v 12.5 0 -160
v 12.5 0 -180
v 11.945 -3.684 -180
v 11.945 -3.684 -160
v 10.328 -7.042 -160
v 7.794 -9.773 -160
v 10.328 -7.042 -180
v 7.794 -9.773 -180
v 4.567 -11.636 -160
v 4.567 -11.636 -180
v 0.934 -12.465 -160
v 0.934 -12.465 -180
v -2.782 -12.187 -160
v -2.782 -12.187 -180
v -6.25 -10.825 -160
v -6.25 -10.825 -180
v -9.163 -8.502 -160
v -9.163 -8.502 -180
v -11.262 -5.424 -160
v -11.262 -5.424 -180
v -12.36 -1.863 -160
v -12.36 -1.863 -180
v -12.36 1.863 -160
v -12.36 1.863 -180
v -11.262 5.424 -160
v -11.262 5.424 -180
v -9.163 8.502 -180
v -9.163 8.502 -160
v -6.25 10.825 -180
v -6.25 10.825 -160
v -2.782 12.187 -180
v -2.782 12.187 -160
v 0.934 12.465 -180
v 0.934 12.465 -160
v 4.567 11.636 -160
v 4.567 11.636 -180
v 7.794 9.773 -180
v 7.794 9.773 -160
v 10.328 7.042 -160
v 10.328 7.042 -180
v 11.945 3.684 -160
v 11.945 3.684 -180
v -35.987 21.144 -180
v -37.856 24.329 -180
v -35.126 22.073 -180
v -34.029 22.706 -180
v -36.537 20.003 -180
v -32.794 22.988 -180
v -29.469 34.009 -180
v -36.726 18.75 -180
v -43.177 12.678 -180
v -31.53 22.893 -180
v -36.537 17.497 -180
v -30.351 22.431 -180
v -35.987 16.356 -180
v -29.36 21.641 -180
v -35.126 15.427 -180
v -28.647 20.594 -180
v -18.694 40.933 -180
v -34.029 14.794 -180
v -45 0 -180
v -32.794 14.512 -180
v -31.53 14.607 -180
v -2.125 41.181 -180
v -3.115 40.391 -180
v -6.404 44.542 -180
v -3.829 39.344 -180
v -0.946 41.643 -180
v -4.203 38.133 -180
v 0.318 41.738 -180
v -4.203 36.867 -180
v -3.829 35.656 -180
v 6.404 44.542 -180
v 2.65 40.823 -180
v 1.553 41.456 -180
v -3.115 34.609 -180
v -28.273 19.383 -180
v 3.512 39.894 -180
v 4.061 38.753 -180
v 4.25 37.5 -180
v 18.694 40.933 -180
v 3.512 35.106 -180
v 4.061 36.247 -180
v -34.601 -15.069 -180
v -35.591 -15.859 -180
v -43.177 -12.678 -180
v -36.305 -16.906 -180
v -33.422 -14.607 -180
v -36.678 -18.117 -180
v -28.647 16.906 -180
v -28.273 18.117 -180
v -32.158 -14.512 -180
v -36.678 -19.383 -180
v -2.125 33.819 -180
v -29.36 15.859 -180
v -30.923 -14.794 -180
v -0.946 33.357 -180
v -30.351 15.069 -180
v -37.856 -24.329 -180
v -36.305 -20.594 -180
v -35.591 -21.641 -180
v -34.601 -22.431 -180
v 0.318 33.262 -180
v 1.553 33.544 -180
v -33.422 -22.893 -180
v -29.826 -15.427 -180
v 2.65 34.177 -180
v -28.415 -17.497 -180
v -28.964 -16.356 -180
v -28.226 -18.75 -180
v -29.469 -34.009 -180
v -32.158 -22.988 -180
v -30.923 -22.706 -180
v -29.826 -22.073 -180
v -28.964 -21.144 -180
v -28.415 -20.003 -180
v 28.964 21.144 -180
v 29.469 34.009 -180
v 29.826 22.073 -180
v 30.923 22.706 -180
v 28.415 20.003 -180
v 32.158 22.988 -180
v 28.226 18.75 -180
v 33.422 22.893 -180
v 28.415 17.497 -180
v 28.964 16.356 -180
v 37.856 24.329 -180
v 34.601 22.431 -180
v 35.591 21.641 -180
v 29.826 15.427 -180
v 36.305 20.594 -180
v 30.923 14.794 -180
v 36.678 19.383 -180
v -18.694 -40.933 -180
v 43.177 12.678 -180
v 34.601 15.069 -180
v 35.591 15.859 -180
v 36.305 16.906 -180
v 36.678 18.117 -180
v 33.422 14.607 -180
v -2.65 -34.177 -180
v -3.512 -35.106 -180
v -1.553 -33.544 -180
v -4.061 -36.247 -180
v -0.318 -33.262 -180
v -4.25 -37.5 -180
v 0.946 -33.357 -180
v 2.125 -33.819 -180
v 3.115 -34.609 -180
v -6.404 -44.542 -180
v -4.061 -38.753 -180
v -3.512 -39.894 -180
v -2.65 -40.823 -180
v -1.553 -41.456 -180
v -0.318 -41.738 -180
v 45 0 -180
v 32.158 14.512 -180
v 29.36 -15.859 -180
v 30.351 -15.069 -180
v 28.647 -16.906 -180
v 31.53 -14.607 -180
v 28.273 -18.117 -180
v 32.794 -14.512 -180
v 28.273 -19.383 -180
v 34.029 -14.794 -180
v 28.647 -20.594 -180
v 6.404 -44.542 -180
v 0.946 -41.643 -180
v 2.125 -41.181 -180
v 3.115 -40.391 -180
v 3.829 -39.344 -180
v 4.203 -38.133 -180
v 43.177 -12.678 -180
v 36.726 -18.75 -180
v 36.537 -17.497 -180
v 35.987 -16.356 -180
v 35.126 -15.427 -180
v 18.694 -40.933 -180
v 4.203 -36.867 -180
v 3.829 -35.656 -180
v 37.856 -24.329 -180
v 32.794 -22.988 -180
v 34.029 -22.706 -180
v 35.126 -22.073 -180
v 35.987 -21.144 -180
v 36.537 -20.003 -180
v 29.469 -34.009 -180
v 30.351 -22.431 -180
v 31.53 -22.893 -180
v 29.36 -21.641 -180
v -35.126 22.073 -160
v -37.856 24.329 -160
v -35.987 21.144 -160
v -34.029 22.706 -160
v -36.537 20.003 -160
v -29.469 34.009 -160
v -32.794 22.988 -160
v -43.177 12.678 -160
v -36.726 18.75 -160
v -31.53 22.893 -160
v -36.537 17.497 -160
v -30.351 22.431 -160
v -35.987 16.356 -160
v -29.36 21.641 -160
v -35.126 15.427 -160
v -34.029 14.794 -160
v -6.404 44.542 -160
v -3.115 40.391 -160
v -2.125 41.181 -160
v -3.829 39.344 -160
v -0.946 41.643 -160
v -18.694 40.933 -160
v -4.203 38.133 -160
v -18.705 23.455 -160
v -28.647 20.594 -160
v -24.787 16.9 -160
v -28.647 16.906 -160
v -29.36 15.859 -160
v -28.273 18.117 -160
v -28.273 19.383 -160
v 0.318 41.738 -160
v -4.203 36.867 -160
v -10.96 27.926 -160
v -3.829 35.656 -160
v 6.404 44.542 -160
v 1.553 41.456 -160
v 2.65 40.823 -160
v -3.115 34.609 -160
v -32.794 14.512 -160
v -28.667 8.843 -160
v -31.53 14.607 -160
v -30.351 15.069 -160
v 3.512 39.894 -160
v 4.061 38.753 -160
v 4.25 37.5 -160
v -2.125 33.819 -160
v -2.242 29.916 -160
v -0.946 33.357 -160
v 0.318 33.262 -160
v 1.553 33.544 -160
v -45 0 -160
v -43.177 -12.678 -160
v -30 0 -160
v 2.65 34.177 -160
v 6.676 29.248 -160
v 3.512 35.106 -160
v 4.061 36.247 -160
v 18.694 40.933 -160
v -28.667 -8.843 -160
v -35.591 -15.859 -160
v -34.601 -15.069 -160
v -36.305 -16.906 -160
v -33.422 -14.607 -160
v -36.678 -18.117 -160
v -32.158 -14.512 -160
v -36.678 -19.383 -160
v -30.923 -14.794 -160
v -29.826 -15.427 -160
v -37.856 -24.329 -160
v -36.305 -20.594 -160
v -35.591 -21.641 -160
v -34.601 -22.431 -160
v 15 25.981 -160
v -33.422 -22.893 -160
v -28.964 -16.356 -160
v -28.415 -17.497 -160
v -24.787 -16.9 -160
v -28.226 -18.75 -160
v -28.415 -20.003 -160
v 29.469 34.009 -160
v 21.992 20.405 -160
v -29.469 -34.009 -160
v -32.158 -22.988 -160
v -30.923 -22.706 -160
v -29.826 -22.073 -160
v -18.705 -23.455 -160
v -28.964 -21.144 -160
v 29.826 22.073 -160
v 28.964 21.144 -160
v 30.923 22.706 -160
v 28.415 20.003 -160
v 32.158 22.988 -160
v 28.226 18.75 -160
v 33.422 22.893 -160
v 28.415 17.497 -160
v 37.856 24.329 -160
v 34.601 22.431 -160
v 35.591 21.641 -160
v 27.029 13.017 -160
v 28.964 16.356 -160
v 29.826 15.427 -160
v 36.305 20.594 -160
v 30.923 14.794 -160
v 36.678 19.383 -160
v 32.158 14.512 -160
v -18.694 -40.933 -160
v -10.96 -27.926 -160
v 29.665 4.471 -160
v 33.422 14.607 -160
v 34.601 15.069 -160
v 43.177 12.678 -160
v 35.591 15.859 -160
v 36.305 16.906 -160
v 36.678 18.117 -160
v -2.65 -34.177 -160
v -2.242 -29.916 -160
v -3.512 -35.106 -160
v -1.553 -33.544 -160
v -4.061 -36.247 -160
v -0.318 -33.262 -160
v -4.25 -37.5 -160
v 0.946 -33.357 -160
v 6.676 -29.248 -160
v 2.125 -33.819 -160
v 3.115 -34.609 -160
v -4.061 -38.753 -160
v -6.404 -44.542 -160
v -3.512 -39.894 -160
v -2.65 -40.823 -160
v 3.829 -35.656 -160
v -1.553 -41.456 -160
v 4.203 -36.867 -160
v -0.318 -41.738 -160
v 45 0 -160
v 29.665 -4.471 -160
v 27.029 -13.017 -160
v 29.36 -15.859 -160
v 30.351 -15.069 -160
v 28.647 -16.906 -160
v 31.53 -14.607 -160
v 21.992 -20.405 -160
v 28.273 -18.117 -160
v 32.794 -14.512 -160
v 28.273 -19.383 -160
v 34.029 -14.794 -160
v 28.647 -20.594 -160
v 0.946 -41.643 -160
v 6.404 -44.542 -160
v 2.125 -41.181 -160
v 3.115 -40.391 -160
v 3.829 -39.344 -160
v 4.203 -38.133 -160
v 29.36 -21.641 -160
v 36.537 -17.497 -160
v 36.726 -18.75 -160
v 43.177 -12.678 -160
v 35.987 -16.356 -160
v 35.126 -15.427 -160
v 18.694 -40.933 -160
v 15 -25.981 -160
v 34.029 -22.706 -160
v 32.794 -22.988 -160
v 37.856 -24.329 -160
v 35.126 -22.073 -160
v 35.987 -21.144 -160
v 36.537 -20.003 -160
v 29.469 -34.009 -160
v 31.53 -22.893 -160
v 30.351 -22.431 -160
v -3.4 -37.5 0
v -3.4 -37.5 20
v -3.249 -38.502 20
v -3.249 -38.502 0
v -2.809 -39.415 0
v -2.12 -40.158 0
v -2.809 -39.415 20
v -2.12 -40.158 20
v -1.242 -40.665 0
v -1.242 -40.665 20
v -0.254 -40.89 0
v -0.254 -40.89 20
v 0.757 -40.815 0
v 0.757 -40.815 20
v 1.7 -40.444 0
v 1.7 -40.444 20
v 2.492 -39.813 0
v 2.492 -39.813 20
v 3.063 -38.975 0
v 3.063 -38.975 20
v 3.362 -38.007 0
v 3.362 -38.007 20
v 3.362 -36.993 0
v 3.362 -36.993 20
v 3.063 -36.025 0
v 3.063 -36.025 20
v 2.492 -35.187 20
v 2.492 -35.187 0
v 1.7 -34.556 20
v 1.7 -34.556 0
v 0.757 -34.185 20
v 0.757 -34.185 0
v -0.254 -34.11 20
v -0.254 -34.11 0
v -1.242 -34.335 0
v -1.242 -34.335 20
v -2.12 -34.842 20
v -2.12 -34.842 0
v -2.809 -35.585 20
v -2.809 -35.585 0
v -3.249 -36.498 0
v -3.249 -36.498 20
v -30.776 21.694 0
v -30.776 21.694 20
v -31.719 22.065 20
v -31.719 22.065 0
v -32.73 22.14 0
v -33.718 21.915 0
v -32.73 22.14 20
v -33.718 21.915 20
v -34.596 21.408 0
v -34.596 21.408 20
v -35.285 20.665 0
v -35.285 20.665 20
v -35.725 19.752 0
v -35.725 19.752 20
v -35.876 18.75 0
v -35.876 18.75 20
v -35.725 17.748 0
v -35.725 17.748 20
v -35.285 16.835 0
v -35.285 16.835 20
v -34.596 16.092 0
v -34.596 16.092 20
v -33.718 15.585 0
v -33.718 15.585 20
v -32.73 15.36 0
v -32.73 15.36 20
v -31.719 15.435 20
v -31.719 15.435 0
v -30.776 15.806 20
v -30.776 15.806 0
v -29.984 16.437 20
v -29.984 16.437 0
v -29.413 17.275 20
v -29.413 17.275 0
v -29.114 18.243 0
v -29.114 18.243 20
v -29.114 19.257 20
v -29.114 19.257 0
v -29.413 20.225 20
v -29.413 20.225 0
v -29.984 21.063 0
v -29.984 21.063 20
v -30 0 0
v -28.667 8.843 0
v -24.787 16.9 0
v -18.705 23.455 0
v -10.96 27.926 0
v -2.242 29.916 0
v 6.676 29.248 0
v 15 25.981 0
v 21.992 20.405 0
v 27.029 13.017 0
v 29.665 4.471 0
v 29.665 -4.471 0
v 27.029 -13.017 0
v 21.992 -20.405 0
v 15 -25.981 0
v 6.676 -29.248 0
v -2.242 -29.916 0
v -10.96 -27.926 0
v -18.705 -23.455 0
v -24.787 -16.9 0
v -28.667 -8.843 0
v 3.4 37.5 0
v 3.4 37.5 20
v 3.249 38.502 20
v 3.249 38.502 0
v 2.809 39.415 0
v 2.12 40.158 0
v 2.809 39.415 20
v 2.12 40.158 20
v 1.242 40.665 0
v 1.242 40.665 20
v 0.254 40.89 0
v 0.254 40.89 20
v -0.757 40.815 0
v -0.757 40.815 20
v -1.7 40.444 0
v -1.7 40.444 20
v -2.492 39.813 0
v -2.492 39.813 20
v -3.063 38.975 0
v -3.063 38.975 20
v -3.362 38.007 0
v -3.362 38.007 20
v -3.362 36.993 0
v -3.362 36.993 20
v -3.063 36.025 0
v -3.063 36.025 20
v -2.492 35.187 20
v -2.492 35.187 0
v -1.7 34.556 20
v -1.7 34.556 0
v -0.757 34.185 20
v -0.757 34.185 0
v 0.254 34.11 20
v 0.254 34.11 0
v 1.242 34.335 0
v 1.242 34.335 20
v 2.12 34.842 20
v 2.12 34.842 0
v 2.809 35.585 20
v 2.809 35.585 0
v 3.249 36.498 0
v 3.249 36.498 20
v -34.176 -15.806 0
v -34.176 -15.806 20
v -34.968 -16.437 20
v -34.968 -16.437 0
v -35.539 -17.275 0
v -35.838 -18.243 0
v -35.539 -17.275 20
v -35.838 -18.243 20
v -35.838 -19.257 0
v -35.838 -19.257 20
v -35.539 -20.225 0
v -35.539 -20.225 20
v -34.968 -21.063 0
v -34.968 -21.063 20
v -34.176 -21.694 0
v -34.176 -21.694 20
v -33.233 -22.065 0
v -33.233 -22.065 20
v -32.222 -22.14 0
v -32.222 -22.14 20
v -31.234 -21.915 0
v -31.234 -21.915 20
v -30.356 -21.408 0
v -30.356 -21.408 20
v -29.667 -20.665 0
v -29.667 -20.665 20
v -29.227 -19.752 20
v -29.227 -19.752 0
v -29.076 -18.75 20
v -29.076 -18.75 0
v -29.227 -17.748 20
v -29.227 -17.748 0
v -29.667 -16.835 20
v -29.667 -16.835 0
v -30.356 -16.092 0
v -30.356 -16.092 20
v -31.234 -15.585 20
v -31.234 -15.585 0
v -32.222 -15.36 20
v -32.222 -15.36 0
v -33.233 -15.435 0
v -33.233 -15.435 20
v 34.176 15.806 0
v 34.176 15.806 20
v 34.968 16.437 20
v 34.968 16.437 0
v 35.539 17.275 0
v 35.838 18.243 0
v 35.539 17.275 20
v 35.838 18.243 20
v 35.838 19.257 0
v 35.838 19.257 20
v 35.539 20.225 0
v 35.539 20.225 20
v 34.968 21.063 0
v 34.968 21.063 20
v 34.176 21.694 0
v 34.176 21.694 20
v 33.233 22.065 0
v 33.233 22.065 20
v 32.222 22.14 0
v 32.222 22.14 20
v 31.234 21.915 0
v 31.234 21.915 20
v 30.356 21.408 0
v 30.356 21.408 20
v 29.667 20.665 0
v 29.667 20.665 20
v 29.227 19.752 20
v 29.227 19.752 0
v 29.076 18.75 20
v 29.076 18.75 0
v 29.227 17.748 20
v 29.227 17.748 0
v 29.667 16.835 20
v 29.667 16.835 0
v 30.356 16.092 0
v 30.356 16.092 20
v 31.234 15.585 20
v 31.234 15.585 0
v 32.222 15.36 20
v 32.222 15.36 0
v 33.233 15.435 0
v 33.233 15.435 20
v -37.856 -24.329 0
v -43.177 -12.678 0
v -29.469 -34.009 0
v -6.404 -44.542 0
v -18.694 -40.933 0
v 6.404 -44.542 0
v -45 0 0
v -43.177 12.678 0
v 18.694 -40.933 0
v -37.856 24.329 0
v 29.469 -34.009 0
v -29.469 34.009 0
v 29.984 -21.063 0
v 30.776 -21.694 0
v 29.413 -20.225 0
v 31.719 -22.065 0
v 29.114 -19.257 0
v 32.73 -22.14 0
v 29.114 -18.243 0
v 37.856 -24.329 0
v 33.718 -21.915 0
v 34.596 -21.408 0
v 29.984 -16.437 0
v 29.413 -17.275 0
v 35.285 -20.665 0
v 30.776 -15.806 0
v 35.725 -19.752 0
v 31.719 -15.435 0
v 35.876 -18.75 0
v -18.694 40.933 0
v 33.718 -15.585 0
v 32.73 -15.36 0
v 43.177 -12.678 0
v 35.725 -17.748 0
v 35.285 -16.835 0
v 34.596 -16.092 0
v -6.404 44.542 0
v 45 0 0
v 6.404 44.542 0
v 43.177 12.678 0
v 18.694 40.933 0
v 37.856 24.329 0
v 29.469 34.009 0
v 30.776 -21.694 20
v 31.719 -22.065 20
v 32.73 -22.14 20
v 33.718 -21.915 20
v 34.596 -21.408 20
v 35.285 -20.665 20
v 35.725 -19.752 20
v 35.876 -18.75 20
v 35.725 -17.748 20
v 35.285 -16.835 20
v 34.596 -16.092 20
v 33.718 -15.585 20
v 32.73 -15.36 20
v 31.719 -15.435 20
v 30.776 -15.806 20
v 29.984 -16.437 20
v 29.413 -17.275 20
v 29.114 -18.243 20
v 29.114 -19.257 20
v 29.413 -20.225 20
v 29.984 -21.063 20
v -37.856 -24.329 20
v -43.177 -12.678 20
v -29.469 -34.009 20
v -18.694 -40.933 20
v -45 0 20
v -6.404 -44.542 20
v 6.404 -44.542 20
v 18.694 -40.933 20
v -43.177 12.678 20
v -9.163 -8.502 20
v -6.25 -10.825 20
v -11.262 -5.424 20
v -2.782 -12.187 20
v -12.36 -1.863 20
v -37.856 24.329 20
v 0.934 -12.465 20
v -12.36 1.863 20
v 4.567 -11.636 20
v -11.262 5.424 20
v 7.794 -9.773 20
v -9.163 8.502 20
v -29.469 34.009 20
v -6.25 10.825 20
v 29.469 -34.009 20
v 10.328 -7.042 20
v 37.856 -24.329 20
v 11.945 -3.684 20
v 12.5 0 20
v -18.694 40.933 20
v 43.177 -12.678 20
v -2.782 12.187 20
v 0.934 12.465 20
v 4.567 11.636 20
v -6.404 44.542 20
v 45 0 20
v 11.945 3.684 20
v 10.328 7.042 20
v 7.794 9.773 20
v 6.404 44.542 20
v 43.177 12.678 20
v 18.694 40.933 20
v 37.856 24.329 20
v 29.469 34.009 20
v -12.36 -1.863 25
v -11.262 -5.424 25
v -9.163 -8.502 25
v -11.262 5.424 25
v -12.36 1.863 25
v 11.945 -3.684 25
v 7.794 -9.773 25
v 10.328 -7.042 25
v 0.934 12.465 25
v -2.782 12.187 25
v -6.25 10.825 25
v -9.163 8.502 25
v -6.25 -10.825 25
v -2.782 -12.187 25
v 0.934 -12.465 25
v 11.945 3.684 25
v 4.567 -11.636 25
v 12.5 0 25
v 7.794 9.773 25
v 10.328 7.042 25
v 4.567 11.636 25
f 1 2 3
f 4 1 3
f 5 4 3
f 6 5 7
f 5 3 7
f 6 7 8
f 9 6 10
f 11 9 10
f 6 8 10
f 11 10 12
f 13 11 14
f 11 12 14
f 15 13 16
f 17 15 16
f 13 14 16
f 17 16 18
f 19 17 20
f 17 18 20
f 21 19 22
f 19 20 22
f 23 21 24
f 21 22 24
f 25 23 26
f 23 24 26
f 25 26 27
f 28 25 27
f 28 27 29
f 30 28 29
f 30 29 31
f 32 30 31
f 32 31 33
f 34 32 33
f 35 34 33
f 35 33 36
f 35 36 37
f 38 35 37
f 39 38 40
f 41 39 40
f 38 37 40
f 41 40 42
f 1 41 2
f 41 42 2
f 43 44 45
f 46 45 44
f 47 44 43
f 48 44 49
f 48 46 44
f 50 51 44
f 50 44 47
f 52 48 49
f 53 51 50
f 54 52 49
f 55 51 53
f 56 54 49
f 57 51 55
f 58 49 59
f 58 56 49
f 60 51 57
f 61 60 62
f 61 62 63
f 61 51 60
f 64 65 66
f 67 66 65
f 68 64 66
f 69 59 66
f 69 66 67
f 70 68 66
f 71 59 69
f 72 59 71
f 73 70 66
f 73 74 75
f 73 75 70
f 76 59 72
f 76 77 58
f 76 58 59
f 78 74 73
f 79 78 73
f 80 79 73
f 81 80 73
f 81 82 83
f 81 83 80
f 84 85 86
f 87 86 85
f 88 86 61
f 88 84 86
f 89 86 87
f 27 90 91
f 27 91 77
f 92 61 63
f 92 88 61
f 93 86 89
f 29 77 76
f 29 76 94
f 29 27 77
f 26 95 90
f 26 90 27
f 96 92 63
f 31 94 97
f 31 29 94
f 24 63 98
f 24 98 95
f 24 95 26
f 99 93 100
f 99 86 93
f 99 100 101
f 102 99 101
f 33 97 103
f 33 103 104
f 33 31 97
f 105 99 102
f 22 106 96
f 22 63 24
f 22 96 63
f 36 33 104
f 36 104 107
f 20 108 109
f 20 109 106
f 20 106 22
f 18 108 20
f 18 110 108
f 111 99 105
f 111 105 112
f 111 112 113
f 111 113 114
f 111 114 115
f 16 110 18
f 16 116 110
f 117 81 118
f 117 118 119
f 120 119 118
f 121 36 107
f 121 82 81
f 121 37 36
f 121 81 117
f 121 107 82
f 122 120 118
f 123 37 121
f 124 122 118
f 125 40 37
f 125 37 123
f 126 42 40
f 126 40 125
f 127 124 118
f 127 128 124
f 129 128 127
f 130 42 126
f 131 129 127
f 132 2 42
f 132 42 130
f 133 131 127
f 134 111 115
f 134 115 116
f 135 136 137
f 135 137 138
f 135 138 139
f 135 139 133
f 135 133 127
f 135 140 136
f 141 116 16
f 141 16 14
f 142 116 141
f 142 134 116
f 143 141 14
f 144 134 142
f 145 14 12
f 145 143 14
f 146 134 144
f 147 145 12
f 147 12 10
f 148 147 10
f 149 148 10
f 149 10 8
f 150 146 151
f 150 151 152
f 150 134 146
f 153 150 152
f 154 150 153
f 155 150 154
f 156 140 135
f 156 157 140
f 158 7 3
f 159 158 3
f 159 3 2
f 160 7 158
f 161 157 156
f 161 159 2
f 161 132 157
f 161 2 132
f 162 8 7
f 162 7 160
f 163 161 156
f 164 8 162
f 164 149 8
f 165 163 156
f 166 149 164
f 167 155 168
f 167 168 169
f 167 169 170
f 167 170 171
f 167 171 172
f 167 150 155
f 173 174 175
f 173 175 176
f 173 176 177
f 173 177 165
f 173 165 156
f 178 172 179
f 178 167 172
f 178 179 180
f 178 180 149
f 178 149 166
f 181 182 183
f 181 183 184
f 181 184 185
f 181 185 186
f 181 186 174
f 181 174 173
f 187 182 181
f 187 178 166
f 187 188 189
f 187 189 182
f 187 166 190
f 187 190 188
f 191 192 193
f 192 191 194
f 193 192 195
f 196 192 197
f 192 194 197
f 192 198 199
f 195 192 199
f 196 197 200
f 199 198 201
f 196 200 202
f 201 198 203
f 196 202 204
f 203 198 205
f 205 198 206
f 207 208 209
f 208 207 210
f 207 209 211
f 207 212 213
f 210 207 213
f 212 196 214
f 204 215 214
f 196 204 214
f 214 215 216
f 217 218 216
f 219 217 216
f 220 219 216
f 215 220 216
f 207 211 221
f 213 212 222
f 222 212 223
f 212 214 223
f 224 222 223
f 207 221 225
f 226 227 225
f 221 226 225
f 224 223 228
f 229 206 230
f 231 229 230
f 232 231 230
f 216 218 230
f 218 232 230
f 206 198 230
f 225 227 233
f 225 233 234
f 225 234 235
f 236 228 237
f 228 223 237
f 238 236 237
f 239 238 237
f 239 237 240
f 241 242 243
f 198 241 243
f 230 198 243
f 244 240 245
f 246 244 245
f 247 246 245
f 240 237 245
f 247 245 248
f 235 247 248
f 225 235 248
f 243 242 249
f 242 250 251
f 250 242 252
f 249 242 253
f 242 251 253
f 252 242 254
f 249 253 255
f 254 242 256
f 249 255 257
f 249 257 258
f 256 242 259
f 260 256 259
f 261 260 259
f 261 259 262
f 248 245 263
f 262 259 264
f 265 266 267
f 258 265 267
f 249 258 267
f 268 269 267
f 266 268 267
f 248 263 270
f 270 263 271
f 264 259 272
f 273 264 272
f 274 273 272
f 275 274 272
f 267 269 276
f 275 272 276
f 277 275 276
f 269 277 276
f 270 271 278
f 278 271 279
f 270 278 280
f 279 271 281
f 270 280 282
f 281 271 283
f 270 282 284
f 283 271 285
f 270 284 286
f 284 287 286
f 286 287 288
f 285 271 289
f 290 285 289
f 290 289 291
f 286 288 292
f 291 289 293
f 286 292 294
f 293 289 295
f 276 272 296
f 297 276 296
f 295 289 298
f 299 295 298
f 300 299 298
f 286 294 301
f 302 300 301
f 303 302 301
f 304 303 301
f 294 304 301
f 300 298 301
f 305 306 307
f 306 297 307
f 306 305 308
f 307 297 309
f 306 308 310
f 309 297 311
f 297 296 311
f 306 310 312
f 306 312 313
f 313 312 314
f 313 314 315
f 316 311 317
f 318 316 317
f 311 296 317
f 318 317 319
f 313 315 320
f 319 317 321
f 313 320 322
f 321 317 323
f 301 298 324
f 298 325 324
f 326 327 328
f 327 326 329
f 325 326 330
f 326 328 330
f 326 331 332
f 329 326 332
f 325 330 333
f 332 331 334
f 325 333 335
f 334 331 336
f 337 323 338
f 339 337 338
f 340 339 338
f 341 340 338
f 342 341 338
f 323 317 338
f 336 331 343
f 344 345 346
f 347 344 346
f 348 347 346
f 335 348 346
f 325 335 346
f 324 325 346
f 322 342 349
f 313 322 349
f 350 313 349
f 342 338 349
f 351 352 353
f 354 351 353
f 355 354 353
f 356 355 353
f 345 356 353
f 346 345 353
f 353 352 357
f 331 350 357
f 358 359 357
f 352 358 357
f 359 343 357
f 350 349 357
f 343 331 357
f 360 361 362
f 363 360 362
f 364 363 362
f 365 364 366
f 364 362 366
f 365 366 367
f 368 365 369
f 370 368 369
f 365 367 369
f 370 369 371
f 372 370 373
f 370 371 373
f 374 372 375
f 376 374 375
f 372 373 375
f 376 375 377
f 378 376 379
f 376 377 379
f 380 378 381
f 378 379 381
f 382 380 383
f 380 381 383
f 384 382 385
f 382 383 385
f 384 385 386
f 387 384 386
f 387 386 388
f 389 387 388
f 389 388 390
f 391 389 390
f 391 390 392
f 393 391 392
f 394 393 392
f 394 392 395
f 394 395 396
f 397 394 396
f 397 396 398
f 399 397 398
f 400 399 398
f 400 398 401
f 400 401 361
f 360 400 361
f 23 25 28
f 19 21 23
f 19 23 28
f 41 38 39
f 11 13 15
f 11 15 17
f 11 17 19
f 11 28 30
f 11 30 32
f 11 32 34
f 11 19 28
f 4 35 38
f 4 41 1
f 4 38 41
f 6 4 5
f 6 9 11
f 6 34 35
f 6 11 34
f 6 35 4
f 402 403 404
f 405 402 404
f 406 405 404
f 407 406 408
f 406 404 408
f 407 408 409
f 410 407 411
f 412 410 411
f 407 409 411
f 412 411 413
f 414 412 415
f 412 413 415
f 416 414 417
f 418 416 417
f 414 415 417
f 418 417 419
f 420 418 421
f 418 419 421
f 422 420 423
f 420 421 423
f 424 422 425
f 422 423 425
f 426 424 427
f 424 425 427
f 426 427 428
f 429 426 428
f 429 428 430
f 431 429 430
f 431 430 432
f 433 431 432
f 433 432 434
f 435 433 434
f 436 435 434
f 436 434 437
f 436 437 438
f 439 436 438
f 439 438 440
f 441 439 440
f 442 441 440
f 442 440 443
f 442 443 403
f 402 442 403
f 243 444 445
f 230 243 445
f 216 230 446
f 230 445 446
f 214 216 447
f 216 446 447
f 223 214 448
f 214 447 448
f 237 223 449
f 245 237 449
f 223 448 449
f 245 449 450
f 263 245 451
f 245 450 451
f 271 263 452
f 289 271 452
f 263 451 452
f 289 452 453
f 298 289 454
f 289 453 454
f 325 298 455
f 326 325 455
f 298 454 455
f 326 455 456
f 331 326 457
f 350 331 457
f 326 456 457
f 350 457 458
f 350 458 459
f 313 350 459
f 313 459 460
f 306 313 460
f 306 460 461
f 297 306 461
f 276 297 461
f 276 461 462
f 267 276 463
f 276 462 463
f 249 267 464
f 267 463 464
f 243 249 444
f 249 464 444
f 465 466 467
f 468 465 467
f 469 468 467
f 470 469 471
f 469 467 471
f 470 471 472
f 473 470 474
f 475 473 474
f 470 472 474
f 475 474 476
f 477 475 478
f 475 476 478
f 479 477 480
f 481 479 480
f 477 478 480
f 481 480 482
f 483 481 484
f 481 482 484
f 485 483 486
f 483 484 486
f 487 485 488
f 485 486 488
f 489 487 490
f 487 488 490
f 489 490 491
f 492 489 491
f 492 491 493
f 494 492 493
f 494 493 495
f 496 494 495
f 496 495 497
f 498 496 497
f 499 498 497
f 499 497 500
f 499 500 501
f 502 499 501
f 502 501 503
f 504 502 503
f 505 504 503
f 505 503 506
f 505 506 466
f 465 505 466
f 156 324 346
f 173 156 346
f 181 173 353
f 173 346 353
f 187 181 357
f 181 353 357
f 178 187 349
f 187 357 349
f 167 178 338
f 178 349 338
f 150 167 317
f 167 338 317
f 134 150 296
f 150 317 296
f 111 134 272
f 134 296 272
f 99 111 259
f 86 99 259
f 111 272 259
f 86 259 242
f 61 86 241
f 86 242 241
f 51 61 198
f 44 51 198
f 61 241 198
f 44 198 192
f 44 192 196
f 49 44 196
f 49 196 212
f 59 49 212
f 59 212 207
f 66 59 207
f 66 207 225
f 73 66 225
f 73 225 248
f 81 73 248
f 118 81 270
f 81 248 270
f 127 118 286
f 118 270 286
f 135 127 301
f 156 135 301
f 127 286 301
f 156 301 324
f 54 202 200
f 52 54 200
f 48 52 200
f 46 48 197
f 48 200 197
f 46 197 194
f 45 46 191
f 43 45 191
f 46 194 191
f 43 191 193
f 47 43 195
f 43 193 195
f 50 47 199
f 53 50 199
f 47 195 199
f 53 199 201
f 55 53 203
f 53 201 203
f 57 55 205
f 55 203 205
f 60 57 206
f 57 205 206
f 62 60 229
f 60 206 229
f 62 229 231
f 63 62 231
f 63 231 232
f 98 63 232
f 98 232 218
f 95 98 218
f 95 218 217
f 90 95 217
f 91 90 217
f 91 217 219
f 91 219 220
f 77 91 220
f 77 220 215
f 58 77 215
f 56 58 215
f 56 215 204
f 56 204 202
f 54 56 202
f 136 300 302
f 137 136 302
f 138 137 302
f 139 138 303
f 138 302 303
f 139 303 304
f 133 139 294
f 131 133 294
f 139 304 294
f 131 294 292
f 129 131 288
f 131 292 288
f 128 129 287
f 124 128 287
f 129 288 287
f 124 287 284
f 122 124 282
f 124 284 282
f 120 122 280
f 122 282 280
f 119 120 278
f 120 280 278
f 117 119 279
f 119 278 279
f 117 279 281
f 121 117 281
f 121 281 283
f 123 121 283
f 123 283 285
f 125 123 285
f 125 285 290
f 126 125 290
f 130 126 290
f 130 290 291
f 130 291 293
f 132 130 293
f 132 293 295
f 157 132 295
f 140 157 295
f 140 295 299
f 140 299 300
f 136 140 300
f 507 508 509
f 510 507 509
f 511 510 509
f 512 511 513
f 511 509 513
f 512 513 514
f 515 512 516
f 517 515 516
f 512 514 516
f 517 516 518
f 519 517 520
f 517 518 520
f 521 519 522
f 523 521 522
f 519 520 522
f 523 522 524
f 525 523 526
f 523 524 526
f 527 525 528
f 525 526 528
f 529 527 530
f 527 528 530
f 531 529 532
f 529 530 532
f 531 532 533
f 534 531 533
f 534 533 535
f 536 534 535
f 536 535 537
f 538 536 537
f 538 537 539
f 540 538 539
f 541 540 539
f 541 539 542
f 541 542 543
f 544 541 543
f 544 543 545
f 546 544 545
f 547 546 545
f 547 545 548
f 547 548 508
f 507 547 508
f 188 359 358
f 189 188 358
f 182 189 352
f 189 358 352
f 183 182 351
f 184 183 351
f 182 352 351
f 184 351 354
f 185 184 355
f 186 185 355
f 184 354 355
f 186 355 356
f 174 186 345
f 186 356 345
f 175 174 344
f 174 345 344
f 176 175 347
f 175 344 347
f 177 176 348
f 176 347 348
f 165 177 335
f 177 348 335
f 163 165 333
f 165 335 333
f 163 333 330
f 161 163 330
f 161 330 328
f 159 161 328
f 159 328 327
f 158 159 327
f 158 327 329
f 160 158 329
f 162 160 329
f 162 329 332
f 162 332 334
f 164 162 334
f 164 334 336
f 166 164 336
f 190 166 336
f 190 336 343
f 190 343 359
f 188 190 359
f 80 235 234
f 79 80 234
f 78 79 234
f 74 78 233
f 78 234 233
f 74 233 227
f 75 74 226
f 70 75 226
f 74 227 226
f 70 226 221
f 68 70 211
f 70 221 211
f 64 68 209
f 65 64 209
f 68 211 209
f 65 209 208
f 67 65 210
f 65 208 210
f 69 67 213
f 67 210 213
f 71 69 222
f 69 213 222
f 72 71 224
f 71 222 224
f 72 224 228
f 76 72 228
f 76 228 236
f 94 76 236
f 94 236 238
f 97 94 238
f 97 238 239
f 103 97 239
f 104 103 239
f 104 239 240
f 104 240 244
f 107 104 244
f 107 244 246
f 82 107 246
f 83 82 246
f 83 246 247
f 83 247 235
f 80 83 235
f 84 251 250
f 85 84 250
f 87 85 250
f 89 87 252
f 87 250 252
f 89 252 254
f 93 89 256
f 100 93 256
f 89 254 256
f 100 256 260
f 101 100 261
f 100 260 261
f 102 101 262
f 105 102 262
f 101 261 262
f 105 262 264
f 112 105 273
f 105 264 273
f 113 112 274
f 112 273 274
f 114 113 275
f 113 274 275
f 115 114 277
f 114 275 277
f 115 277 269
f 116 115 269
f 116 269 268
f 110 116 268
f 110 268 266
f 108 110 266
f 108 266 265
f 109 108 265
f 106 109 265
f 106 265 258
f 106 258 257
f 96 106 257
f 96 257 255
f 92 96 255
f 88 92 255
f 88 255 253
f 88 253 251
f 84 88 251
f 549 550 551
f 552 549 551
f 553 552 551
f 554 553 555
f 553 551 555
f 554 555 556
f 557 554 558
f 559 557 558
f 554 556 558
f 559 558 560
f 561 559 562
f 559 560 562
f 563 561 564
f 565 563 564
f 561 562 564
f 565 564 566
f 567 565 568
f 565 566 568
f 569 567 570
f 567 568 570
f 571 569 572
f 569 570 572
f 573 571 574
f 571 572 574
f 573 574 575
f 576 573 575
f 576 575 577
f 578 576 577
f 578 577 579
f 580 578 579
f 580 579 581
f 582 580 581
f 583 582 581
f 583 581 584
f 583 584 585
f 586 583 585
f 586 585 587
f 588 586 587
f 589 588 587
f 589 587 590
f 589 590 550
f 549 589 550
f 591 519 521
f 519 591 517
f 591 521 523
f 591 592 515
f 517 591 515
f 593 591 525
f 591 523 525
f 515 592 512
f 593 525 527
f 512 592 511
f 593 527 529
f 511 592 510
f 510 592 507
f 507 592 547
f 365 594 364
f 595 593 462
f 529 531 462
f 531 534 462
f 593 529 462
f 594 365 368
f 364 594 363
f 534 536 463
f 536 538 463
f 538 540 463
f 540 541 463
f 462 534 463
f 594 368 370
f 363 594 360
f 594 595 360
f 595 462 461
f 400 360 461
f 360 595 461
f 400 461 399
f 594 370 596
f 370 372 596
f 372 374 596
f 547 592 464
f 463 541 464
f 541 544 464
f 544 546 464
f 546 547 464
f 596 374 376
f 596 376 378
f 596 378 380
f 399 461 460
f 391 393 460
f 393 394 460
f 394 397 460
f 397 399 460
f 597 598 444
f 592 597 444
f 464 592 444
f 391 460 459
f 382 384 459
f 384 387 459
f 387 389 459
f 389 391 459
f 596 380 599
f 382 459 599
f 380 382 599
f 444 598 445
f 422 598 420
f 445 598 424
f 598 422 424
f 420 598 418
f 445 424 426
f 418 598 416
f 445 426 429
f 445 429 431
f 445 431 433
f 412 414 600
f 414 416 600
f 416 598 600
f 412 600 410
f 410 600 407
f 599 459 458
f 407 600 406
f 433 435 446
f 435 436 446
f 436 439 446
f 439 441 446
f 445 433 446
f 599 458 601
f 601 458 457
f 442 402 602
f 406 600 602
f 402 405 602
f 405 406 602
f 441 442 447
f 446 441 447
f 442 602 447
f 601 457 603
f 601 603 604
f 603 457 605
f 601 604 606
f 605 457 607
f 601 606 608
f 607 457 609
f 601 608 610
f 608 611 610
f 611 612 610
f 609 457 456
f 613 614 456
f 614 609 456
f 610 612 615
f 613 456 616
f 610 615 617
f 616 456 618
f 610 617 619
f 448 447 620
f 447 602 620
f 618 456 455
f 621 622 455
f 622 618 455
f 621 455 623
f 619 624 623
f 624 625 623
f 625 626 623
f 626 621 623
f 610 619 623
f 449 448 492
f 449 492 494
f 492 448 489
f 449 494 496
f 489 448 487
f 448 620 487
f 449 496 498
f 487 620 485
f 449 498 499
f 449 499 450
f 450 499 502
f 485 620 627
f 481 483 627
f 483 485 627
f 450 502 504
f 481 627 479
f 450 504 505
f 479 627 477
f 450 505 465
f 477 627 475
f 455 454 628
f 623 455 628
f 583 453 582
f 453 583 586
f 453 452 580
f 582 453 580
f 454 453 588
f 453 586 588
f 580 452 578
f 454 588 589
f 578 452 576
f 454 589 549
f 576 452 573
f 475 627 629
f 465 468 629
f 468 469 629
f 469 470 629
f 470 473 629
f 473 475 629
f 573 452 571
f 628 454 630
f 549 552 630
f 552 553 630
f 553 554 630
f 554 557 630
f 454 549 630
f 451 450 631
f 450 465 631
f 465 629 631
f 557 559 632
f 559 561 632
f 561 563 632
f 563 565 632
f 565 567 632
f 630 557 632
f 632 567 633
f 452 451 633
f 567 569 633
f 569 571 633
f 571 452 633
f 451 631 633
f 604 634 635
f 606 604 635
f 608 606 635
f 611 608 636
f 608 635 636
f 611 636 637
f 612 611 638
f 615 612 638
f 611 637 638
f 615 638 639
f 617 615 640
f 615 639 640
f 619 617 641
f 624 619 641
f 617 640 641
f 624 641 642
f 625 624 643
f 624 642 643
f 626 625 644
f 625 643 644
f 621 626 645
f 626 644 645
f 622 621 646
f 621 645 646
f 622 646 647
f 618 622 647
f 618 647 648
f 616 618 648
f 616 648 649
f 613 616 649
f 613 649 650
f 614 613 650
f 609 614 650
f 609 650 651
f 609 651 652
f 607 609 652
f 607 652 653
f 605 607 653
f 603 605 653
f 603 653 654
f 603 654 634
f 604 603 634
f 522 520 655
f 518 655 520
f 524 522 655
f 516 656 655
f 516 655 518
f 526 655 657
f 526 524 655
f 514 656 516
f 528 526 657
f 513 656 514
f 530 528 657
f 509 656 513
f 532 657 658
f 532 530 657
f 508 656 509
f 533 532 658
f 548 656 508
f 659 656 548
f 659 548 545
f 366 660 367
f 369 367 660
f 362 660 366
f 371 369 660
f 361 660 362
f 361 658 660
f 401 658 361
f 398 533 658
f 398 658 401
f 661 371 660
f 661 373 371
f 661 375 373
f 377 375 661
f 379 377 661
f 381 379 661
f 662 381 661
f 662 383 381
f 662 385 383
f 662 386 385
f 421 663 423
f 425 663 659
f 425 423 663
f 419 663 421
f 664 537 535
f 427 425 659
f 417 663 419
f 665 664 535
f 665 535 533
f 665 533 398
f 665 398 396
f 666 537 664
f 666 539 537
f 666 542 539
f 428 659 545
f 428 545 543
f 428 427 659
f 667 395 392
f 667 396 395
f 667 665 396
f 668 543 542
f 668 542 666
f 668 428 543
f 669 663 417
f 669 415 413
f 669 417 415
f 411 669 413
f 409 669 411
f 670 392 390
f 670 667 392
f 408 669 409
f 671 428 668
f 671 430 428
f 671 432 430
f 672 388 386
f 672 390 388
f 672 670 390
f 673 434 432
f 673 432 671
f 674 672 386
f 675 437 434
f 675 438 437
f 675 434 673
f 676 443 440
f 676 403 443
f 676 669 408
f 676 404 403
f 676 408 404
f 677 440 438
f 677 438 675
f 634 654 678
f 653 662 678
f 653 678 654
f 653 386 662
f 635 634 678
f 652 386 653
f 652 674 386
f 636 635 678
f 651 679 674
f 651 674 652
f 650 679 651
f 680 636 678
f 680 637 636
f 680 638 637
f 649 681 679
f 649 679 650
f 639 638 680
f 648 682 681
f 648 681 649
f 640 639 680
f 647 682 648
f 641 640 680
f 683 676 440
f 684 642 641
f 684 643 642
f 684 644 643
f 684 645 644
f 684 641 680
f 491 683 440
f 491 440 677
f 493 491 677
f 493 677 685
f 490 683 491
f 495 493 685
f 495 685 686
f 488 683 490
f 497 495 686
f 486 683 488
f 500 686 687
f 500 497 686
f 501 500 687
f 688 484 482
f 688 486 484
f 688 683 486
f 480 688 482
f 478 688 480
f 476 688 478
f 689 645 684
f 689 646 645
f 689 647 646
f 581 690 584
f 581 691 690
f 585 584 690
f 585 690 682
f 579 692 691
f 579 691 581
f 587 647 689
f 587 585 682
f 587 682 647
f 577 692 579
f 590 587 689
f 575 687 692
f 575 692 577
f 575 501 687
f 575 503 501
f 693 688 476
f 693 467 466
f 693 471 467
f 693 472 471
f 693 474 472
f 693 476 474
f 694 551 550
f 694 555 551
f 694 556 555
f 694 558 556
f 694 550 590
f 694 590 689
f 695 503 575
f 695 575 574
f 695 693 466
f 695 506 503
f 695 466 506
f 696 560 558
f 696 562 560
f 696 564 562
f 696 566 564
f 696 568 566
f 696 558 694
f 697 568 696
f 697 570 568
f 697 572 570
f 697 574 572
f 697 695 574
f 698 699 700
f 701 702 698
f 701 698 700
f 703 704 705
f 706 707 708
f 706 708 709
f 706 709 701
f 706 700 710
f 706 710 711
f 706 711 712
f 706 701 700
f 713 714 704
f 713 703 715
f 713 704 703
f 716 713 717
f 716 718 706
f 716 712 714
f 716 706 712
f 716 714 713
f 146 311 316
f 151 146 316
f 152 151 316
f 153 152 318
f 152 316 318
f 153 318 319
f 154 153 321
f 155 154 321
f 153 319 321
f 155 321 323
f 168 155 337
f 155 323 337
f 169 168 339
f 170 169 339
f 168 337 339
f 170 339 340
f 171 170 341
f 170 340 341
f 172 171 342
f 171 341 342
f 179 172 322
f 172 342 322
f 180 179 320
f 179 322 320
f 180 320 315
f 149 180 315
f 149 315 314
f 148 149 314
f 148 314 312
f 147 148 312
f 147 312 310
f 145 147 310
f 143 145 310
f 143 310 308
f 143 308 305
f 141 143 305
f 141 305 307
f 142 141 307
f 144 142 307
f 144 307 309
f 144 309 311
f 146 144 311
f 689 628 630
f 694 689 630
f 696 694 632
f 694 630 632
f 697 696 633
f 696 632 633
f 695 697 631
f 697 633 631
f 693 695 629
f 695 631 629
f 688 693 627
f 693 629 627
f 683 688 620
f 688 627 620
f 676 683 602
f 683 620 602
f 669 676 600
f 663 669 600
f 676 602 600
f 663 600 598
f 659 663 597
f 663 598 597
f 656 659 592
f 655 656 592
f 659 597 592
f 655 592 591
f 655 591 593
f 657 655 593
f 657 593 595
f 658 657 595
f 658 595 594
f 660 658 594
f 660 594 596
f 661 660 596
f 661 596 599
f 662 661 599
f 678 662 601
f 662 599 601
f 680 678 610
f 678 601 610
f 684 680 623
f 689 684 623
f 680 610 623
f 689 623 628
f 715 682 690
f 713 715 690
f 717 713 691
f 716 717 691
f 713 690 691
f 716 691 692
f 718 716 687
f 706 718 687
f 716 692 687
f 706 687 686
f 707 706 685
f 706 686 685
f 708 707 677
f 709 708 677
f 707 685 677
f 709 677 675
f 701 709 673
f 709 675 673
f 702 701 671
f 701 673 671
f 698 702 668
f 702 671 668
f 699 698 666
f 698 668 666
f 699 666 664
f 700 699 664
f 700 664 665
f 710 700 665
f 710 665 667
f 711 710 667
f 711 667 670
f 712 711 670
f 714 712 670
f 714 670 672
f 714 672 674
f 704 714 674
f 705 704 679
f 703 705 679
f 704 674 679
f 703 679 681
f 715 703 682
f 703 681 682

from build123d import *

# Parameters (mm, degrees)
SKETCH1_R                      = 45
BOSS_EXTRUDE1_DEPTH            = 20
SKETCH2_R                      = 30
BOSS_EXTRUDE2_DEPTH            = 160
SKETCH3_R                      = 45
BOSS_EXTRUDE3_DEPTH            = 20
SKETCH4_R                      = 12.5
BOSS_EXTRUDE4_DEPTH            = 5
M8X1_25_TAPPED_HOLE1_REACH     = 202
M8X1_25_TAPPED_HOLE1_BORE_R    = 3.4
CIRPATTERN1_COUNT              = 6
F_8_5_8_5_DIAMETER_HOLE1_D     = 8.5
F_8_5_8_5_DIAMETER_HOLE1_DEPTH = 20.001
CIRPATTERN2_COUNT              = 6
SKETCH11_R                     = 12.5
CUT_EXTRUDE1_DEPTH             = 20


with BuildPart() as part:
    # Sketch1 → Boss-Extrude1 (new body)
    with BuildSketch(Plane.XY):
        Circle(SKETCH1_R)
    extrude(amount=BOSS_EXTRUDE1_DEPTH)

    # Sketch2 → Boss-Extrude2 (add)
    with BuildSketch(Plane(origin=(0, 0, 0), x_dir=(-1, 0, 0), z_dir=(0, 0, -1))):
        Circle(SKETCH2_R)
    extrude(amount=BOSS_EXTRUDE2_DEPTH)

    # Sketch3 → Boss-Extrude3 (add)
    with BuildSketch(Plane(origin=(0, 0, -160), x_dir=(-1, 0, 0), z_dir=(0, 0, -1))):
        with Locations(Location((0, 0, 0), (0, 0, 180))):  # turned: the seam where the file's is
            Circle(SKETCH3_R)
    extrude(amount=BOSS_EXTRUDE3_DEPTH)

    # Sketch4 → Boss-Extrude4 (add)
    with BuildSketch(Plane.XY.offset(20)):
        Circle(SKETCH4_R)
    extrude(amount=BOSS_EXTRUDE4_DEPTH)

    # M8x1.25 Tapped Hole1 bore → M8x1.25 Tapped Hole1 (cut, up to next)
    with BuildSketch(Plane.XY.offset(20), mode=Mode.PRIVATE) as m8x1_25_tapped_hole1_sk1:
        with Locations((0, 37.5)):
            Circle(M8X1_25_TAPPED_HOLE1_BORE_R)
    m8x1_25_tapped_hole1_tool1 = extrude(m8x1_25_tapped_hole1_sk1.sketch, amount=-M8X1_25_TAPPED_HOLE1_REACH, mode=Mode.PRIVATE) & part.part
    m8x1_25_tapped_hole1 = m8x1_25_tapped_hole1_tool1.solids().sort_by_distance((0, 37.5, 20))[0]
    add(m8x1_25_tapped_hole1, mode=Mode.SUBTRACT)

    # CirPattern1: M8x1.25 Tapped Hole1 ×6 about axis
    cirpattern1_axis = Axis((0, 0, 0), (0, 0, 1))
    for i in range(1, CIRPATTERN1_COUNT):
        add(m8x1_25_tapped_hole1.rotate(cirpattern1_axis, i * 360 / CIRPATTERN1_COUNT), mode=Mode.SUBTRACT)

    # Ø8.5 (8.5) Diameter Hole1
    with Locations(Plane(origin=(0, 0, -180), x_dir=(-1, 0, 0), z_dir=(0, 0, -1))):
        with Locations((0, 37.5)):
            f_8_5_8_5_diameter_hole1 = Hole(F_8_5_8_5_DIAMETER_HOLE1_D / 2, depth=F_8_5_8_5_DIAMETER_HOLE1_DEPTH)

    # CirPattern2: Ø8.5 (8.5) Diameter Hole1 ×6 about axis
    cirpattern2_axis = Axis((0, 0, 0), (0, 0, 1))
    for i in range(1, CIRPATTERN2_COUNT):
        add(f_8_5_8_5_diameter_hole1.rotate(cirpattern2_axis, i * 360 / CIRPATTERN2_COUNT), mode=Mode.SUBTRACT)

    # Sketch11 → Cut-Extrude1 (cut)
    with BuildSketch(Plane(origin=(0, 0, -180), x_dir=(-1, 0, 0), z_dir=(0, 0, -1))):
        with Locations(Location((0, 0, 0), (0, 0, 180))):  # turned: the seam where the file's is
            Circle(SKETCH11_R)
    extrude(amount=-CUT_EXTRUDE1_DEPTH, mode=Mode.SUBTRACT)


solid = part.part
